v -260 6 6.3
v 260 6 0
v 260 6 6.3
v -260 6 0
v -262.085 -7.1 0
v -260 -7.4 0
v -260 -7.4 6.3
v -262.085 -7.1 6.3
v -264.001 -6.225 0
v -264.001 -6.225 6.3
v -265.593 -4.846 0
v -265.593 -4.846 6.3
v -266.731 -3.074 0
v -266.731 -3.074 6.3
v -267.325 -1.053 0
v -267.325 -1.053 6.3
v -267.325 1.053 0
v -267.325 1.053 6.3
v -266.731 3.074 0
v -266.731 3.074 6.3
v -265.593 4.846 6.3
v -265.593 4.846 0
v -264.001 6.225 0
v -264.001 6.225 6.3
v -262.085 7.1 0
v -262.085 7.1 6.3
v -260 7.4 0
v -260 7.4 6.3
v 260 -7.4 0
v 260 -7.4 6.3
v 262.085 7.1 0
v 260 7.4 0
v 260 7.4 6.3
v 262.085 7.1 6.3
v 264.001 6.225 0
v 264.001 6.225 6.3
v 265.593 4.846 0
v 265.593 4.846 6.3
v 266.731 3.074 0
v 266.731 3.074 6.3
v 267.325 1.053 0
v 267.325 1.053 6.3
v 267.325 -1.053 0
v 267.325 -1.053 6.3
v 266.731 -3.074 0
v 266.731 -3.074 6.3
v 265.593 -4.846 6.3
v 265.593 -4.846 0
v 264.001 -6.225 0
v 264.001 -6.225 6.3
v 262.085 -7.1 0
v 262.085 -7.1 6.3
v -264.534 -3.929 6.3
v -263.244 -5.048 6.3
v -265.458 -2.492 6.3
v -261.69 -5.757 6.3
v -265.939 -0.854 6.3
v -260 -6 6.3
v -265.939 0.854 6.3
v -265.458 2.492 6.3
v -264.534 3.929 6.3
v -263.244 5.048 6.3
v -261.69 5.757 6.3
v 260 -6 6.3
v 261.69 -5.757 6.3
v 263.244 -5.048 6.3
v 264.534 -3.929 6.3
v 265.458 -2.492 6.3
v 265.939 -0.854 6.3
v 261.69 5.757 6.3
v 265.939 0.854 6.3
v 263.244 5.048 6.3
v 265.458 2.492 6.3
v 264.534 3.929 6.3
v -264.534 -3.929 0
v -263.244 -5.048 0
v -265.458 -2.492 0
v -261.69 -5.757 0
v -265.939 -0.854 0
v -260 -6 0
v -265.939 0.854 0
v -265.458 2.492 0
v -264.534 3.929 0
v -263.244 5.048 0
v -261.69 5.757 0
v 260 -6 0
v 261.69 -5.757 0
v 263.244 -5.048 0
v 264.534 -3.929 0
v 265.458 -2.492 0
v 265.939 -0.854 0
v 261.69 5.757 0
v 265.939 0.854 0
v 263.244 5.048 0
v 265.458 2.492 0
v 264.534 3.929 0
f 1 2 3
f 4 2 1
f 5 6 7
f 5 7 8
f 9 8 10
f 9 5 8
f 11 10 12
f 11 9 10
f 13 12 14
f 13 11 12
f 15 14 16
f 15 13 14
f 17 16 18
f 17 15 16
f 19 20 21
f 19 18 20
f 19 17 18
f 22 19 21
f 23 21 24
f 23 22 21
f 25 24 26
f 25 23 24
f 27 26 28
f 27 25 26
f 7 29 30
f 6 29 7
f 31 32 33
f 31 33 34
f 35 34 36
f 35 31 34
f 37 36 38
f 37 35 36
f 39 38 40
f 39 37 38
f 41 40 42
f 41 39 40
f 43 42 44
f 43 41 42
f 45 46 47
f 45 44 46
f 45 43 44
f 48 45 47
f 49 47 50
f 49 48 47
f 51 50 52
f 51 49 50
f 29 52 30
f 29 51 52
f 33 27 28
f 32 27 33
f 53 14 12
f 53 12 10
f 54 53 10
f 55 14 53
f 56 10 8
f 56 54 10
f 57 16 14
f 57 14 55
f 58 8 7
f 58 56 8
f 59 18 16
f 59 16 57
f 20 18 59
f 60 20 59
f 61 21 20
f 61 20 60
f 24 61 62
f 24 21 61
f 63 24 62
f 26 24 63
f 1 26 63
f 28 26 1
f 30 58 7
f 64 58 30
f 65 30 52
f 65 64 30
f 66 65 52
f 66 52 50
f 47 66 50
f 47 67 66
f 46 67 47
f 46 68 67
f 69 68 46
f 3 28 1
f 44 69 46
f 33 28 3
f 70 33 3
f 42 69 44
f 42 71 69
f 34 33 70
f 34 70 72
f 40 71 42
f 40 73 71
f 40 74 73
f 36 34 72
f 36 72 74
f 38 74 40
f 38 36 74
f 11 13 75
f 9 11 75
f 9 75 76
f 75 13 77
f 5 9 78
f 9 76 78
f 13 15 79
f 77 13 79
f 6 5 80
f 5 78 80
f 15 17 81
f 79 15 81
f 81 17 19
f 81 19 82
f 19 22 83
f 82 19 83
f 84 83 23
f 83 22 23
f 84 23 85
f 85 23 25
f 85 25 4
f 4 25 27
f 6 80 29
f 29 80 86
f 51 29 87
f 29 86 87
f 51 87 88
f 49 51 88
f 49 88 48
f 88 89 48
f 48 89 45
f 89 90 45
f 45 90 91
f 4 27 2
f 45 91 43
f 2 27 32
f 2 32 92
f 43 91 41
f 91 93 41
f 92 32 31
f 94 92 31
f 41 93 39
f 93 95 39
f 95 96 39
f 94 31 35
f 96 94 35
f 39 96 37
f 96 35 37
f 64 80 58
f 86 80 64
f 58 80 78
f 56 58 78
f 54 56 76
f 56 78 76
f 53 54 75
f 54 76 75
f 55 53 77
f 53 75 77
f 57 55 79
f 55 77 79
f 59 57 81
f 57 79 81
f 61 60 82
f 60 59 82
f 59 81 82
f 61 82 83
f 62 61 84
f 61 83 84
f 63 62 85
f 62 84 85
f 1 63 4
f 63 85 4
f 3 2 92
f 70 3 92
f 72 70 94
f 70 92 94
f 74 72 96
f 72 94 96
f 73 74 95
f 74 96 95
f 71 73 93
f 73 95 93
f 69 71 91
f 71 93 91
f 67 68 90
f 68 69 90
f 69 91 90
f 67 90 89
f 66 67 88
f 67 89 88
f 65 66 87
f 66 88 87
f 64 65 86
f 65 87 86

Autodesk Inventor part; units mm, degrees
ref_plane "YZ Plane" through (0, 0, 0) normal (1, 0, 0) x (0, 1, 0)
ref_plane "XZ Plane" through (0, 0, 0) normal (0, 1, 0) x (-1, 0, 0)
ref_plane "XY Plane" through (0, 0, 0) normal (0, 0, 1) x (1, 0, 0)
sketch "Szkic1" plane through (0, 0, 0) normal (0, 0, 1) x (1, 0, 0)
  line L0 (260, 0) -> (-260, 0) construction
  line L1 (260, 6) -> (-260, 6)
  line L2 (-260, -6) -> (260, -6)
  arc A0 (260, -6) -> (260, 6) centre (260, 0) ccw
  arc A1 (-260, 6) -> (-260, -6) centre (-260, 0) ccw
  line L3 (-260, 7.4) -> (260, 7.4)
  arc A2 (260, -7.4) -> (260, 7.4) centre (260, 0) ccw
  line L4 (260, -7.4) -> (-260, -7.4)
  arc A3 (-260, 7.4) -> (-260, -7.4) centre (-260, 0) ccw
  point P0 (0, 0)
  dimension "d0" = 260
  dimension "d1" = 12
  dimension "d2" = 1.4
extrude "Wyciągnięcie proste1" add sketch "Szkic1" along normal blind 6.3
properties part number "COTS_GENERIC_Y_Axis_Timing_Belt"
